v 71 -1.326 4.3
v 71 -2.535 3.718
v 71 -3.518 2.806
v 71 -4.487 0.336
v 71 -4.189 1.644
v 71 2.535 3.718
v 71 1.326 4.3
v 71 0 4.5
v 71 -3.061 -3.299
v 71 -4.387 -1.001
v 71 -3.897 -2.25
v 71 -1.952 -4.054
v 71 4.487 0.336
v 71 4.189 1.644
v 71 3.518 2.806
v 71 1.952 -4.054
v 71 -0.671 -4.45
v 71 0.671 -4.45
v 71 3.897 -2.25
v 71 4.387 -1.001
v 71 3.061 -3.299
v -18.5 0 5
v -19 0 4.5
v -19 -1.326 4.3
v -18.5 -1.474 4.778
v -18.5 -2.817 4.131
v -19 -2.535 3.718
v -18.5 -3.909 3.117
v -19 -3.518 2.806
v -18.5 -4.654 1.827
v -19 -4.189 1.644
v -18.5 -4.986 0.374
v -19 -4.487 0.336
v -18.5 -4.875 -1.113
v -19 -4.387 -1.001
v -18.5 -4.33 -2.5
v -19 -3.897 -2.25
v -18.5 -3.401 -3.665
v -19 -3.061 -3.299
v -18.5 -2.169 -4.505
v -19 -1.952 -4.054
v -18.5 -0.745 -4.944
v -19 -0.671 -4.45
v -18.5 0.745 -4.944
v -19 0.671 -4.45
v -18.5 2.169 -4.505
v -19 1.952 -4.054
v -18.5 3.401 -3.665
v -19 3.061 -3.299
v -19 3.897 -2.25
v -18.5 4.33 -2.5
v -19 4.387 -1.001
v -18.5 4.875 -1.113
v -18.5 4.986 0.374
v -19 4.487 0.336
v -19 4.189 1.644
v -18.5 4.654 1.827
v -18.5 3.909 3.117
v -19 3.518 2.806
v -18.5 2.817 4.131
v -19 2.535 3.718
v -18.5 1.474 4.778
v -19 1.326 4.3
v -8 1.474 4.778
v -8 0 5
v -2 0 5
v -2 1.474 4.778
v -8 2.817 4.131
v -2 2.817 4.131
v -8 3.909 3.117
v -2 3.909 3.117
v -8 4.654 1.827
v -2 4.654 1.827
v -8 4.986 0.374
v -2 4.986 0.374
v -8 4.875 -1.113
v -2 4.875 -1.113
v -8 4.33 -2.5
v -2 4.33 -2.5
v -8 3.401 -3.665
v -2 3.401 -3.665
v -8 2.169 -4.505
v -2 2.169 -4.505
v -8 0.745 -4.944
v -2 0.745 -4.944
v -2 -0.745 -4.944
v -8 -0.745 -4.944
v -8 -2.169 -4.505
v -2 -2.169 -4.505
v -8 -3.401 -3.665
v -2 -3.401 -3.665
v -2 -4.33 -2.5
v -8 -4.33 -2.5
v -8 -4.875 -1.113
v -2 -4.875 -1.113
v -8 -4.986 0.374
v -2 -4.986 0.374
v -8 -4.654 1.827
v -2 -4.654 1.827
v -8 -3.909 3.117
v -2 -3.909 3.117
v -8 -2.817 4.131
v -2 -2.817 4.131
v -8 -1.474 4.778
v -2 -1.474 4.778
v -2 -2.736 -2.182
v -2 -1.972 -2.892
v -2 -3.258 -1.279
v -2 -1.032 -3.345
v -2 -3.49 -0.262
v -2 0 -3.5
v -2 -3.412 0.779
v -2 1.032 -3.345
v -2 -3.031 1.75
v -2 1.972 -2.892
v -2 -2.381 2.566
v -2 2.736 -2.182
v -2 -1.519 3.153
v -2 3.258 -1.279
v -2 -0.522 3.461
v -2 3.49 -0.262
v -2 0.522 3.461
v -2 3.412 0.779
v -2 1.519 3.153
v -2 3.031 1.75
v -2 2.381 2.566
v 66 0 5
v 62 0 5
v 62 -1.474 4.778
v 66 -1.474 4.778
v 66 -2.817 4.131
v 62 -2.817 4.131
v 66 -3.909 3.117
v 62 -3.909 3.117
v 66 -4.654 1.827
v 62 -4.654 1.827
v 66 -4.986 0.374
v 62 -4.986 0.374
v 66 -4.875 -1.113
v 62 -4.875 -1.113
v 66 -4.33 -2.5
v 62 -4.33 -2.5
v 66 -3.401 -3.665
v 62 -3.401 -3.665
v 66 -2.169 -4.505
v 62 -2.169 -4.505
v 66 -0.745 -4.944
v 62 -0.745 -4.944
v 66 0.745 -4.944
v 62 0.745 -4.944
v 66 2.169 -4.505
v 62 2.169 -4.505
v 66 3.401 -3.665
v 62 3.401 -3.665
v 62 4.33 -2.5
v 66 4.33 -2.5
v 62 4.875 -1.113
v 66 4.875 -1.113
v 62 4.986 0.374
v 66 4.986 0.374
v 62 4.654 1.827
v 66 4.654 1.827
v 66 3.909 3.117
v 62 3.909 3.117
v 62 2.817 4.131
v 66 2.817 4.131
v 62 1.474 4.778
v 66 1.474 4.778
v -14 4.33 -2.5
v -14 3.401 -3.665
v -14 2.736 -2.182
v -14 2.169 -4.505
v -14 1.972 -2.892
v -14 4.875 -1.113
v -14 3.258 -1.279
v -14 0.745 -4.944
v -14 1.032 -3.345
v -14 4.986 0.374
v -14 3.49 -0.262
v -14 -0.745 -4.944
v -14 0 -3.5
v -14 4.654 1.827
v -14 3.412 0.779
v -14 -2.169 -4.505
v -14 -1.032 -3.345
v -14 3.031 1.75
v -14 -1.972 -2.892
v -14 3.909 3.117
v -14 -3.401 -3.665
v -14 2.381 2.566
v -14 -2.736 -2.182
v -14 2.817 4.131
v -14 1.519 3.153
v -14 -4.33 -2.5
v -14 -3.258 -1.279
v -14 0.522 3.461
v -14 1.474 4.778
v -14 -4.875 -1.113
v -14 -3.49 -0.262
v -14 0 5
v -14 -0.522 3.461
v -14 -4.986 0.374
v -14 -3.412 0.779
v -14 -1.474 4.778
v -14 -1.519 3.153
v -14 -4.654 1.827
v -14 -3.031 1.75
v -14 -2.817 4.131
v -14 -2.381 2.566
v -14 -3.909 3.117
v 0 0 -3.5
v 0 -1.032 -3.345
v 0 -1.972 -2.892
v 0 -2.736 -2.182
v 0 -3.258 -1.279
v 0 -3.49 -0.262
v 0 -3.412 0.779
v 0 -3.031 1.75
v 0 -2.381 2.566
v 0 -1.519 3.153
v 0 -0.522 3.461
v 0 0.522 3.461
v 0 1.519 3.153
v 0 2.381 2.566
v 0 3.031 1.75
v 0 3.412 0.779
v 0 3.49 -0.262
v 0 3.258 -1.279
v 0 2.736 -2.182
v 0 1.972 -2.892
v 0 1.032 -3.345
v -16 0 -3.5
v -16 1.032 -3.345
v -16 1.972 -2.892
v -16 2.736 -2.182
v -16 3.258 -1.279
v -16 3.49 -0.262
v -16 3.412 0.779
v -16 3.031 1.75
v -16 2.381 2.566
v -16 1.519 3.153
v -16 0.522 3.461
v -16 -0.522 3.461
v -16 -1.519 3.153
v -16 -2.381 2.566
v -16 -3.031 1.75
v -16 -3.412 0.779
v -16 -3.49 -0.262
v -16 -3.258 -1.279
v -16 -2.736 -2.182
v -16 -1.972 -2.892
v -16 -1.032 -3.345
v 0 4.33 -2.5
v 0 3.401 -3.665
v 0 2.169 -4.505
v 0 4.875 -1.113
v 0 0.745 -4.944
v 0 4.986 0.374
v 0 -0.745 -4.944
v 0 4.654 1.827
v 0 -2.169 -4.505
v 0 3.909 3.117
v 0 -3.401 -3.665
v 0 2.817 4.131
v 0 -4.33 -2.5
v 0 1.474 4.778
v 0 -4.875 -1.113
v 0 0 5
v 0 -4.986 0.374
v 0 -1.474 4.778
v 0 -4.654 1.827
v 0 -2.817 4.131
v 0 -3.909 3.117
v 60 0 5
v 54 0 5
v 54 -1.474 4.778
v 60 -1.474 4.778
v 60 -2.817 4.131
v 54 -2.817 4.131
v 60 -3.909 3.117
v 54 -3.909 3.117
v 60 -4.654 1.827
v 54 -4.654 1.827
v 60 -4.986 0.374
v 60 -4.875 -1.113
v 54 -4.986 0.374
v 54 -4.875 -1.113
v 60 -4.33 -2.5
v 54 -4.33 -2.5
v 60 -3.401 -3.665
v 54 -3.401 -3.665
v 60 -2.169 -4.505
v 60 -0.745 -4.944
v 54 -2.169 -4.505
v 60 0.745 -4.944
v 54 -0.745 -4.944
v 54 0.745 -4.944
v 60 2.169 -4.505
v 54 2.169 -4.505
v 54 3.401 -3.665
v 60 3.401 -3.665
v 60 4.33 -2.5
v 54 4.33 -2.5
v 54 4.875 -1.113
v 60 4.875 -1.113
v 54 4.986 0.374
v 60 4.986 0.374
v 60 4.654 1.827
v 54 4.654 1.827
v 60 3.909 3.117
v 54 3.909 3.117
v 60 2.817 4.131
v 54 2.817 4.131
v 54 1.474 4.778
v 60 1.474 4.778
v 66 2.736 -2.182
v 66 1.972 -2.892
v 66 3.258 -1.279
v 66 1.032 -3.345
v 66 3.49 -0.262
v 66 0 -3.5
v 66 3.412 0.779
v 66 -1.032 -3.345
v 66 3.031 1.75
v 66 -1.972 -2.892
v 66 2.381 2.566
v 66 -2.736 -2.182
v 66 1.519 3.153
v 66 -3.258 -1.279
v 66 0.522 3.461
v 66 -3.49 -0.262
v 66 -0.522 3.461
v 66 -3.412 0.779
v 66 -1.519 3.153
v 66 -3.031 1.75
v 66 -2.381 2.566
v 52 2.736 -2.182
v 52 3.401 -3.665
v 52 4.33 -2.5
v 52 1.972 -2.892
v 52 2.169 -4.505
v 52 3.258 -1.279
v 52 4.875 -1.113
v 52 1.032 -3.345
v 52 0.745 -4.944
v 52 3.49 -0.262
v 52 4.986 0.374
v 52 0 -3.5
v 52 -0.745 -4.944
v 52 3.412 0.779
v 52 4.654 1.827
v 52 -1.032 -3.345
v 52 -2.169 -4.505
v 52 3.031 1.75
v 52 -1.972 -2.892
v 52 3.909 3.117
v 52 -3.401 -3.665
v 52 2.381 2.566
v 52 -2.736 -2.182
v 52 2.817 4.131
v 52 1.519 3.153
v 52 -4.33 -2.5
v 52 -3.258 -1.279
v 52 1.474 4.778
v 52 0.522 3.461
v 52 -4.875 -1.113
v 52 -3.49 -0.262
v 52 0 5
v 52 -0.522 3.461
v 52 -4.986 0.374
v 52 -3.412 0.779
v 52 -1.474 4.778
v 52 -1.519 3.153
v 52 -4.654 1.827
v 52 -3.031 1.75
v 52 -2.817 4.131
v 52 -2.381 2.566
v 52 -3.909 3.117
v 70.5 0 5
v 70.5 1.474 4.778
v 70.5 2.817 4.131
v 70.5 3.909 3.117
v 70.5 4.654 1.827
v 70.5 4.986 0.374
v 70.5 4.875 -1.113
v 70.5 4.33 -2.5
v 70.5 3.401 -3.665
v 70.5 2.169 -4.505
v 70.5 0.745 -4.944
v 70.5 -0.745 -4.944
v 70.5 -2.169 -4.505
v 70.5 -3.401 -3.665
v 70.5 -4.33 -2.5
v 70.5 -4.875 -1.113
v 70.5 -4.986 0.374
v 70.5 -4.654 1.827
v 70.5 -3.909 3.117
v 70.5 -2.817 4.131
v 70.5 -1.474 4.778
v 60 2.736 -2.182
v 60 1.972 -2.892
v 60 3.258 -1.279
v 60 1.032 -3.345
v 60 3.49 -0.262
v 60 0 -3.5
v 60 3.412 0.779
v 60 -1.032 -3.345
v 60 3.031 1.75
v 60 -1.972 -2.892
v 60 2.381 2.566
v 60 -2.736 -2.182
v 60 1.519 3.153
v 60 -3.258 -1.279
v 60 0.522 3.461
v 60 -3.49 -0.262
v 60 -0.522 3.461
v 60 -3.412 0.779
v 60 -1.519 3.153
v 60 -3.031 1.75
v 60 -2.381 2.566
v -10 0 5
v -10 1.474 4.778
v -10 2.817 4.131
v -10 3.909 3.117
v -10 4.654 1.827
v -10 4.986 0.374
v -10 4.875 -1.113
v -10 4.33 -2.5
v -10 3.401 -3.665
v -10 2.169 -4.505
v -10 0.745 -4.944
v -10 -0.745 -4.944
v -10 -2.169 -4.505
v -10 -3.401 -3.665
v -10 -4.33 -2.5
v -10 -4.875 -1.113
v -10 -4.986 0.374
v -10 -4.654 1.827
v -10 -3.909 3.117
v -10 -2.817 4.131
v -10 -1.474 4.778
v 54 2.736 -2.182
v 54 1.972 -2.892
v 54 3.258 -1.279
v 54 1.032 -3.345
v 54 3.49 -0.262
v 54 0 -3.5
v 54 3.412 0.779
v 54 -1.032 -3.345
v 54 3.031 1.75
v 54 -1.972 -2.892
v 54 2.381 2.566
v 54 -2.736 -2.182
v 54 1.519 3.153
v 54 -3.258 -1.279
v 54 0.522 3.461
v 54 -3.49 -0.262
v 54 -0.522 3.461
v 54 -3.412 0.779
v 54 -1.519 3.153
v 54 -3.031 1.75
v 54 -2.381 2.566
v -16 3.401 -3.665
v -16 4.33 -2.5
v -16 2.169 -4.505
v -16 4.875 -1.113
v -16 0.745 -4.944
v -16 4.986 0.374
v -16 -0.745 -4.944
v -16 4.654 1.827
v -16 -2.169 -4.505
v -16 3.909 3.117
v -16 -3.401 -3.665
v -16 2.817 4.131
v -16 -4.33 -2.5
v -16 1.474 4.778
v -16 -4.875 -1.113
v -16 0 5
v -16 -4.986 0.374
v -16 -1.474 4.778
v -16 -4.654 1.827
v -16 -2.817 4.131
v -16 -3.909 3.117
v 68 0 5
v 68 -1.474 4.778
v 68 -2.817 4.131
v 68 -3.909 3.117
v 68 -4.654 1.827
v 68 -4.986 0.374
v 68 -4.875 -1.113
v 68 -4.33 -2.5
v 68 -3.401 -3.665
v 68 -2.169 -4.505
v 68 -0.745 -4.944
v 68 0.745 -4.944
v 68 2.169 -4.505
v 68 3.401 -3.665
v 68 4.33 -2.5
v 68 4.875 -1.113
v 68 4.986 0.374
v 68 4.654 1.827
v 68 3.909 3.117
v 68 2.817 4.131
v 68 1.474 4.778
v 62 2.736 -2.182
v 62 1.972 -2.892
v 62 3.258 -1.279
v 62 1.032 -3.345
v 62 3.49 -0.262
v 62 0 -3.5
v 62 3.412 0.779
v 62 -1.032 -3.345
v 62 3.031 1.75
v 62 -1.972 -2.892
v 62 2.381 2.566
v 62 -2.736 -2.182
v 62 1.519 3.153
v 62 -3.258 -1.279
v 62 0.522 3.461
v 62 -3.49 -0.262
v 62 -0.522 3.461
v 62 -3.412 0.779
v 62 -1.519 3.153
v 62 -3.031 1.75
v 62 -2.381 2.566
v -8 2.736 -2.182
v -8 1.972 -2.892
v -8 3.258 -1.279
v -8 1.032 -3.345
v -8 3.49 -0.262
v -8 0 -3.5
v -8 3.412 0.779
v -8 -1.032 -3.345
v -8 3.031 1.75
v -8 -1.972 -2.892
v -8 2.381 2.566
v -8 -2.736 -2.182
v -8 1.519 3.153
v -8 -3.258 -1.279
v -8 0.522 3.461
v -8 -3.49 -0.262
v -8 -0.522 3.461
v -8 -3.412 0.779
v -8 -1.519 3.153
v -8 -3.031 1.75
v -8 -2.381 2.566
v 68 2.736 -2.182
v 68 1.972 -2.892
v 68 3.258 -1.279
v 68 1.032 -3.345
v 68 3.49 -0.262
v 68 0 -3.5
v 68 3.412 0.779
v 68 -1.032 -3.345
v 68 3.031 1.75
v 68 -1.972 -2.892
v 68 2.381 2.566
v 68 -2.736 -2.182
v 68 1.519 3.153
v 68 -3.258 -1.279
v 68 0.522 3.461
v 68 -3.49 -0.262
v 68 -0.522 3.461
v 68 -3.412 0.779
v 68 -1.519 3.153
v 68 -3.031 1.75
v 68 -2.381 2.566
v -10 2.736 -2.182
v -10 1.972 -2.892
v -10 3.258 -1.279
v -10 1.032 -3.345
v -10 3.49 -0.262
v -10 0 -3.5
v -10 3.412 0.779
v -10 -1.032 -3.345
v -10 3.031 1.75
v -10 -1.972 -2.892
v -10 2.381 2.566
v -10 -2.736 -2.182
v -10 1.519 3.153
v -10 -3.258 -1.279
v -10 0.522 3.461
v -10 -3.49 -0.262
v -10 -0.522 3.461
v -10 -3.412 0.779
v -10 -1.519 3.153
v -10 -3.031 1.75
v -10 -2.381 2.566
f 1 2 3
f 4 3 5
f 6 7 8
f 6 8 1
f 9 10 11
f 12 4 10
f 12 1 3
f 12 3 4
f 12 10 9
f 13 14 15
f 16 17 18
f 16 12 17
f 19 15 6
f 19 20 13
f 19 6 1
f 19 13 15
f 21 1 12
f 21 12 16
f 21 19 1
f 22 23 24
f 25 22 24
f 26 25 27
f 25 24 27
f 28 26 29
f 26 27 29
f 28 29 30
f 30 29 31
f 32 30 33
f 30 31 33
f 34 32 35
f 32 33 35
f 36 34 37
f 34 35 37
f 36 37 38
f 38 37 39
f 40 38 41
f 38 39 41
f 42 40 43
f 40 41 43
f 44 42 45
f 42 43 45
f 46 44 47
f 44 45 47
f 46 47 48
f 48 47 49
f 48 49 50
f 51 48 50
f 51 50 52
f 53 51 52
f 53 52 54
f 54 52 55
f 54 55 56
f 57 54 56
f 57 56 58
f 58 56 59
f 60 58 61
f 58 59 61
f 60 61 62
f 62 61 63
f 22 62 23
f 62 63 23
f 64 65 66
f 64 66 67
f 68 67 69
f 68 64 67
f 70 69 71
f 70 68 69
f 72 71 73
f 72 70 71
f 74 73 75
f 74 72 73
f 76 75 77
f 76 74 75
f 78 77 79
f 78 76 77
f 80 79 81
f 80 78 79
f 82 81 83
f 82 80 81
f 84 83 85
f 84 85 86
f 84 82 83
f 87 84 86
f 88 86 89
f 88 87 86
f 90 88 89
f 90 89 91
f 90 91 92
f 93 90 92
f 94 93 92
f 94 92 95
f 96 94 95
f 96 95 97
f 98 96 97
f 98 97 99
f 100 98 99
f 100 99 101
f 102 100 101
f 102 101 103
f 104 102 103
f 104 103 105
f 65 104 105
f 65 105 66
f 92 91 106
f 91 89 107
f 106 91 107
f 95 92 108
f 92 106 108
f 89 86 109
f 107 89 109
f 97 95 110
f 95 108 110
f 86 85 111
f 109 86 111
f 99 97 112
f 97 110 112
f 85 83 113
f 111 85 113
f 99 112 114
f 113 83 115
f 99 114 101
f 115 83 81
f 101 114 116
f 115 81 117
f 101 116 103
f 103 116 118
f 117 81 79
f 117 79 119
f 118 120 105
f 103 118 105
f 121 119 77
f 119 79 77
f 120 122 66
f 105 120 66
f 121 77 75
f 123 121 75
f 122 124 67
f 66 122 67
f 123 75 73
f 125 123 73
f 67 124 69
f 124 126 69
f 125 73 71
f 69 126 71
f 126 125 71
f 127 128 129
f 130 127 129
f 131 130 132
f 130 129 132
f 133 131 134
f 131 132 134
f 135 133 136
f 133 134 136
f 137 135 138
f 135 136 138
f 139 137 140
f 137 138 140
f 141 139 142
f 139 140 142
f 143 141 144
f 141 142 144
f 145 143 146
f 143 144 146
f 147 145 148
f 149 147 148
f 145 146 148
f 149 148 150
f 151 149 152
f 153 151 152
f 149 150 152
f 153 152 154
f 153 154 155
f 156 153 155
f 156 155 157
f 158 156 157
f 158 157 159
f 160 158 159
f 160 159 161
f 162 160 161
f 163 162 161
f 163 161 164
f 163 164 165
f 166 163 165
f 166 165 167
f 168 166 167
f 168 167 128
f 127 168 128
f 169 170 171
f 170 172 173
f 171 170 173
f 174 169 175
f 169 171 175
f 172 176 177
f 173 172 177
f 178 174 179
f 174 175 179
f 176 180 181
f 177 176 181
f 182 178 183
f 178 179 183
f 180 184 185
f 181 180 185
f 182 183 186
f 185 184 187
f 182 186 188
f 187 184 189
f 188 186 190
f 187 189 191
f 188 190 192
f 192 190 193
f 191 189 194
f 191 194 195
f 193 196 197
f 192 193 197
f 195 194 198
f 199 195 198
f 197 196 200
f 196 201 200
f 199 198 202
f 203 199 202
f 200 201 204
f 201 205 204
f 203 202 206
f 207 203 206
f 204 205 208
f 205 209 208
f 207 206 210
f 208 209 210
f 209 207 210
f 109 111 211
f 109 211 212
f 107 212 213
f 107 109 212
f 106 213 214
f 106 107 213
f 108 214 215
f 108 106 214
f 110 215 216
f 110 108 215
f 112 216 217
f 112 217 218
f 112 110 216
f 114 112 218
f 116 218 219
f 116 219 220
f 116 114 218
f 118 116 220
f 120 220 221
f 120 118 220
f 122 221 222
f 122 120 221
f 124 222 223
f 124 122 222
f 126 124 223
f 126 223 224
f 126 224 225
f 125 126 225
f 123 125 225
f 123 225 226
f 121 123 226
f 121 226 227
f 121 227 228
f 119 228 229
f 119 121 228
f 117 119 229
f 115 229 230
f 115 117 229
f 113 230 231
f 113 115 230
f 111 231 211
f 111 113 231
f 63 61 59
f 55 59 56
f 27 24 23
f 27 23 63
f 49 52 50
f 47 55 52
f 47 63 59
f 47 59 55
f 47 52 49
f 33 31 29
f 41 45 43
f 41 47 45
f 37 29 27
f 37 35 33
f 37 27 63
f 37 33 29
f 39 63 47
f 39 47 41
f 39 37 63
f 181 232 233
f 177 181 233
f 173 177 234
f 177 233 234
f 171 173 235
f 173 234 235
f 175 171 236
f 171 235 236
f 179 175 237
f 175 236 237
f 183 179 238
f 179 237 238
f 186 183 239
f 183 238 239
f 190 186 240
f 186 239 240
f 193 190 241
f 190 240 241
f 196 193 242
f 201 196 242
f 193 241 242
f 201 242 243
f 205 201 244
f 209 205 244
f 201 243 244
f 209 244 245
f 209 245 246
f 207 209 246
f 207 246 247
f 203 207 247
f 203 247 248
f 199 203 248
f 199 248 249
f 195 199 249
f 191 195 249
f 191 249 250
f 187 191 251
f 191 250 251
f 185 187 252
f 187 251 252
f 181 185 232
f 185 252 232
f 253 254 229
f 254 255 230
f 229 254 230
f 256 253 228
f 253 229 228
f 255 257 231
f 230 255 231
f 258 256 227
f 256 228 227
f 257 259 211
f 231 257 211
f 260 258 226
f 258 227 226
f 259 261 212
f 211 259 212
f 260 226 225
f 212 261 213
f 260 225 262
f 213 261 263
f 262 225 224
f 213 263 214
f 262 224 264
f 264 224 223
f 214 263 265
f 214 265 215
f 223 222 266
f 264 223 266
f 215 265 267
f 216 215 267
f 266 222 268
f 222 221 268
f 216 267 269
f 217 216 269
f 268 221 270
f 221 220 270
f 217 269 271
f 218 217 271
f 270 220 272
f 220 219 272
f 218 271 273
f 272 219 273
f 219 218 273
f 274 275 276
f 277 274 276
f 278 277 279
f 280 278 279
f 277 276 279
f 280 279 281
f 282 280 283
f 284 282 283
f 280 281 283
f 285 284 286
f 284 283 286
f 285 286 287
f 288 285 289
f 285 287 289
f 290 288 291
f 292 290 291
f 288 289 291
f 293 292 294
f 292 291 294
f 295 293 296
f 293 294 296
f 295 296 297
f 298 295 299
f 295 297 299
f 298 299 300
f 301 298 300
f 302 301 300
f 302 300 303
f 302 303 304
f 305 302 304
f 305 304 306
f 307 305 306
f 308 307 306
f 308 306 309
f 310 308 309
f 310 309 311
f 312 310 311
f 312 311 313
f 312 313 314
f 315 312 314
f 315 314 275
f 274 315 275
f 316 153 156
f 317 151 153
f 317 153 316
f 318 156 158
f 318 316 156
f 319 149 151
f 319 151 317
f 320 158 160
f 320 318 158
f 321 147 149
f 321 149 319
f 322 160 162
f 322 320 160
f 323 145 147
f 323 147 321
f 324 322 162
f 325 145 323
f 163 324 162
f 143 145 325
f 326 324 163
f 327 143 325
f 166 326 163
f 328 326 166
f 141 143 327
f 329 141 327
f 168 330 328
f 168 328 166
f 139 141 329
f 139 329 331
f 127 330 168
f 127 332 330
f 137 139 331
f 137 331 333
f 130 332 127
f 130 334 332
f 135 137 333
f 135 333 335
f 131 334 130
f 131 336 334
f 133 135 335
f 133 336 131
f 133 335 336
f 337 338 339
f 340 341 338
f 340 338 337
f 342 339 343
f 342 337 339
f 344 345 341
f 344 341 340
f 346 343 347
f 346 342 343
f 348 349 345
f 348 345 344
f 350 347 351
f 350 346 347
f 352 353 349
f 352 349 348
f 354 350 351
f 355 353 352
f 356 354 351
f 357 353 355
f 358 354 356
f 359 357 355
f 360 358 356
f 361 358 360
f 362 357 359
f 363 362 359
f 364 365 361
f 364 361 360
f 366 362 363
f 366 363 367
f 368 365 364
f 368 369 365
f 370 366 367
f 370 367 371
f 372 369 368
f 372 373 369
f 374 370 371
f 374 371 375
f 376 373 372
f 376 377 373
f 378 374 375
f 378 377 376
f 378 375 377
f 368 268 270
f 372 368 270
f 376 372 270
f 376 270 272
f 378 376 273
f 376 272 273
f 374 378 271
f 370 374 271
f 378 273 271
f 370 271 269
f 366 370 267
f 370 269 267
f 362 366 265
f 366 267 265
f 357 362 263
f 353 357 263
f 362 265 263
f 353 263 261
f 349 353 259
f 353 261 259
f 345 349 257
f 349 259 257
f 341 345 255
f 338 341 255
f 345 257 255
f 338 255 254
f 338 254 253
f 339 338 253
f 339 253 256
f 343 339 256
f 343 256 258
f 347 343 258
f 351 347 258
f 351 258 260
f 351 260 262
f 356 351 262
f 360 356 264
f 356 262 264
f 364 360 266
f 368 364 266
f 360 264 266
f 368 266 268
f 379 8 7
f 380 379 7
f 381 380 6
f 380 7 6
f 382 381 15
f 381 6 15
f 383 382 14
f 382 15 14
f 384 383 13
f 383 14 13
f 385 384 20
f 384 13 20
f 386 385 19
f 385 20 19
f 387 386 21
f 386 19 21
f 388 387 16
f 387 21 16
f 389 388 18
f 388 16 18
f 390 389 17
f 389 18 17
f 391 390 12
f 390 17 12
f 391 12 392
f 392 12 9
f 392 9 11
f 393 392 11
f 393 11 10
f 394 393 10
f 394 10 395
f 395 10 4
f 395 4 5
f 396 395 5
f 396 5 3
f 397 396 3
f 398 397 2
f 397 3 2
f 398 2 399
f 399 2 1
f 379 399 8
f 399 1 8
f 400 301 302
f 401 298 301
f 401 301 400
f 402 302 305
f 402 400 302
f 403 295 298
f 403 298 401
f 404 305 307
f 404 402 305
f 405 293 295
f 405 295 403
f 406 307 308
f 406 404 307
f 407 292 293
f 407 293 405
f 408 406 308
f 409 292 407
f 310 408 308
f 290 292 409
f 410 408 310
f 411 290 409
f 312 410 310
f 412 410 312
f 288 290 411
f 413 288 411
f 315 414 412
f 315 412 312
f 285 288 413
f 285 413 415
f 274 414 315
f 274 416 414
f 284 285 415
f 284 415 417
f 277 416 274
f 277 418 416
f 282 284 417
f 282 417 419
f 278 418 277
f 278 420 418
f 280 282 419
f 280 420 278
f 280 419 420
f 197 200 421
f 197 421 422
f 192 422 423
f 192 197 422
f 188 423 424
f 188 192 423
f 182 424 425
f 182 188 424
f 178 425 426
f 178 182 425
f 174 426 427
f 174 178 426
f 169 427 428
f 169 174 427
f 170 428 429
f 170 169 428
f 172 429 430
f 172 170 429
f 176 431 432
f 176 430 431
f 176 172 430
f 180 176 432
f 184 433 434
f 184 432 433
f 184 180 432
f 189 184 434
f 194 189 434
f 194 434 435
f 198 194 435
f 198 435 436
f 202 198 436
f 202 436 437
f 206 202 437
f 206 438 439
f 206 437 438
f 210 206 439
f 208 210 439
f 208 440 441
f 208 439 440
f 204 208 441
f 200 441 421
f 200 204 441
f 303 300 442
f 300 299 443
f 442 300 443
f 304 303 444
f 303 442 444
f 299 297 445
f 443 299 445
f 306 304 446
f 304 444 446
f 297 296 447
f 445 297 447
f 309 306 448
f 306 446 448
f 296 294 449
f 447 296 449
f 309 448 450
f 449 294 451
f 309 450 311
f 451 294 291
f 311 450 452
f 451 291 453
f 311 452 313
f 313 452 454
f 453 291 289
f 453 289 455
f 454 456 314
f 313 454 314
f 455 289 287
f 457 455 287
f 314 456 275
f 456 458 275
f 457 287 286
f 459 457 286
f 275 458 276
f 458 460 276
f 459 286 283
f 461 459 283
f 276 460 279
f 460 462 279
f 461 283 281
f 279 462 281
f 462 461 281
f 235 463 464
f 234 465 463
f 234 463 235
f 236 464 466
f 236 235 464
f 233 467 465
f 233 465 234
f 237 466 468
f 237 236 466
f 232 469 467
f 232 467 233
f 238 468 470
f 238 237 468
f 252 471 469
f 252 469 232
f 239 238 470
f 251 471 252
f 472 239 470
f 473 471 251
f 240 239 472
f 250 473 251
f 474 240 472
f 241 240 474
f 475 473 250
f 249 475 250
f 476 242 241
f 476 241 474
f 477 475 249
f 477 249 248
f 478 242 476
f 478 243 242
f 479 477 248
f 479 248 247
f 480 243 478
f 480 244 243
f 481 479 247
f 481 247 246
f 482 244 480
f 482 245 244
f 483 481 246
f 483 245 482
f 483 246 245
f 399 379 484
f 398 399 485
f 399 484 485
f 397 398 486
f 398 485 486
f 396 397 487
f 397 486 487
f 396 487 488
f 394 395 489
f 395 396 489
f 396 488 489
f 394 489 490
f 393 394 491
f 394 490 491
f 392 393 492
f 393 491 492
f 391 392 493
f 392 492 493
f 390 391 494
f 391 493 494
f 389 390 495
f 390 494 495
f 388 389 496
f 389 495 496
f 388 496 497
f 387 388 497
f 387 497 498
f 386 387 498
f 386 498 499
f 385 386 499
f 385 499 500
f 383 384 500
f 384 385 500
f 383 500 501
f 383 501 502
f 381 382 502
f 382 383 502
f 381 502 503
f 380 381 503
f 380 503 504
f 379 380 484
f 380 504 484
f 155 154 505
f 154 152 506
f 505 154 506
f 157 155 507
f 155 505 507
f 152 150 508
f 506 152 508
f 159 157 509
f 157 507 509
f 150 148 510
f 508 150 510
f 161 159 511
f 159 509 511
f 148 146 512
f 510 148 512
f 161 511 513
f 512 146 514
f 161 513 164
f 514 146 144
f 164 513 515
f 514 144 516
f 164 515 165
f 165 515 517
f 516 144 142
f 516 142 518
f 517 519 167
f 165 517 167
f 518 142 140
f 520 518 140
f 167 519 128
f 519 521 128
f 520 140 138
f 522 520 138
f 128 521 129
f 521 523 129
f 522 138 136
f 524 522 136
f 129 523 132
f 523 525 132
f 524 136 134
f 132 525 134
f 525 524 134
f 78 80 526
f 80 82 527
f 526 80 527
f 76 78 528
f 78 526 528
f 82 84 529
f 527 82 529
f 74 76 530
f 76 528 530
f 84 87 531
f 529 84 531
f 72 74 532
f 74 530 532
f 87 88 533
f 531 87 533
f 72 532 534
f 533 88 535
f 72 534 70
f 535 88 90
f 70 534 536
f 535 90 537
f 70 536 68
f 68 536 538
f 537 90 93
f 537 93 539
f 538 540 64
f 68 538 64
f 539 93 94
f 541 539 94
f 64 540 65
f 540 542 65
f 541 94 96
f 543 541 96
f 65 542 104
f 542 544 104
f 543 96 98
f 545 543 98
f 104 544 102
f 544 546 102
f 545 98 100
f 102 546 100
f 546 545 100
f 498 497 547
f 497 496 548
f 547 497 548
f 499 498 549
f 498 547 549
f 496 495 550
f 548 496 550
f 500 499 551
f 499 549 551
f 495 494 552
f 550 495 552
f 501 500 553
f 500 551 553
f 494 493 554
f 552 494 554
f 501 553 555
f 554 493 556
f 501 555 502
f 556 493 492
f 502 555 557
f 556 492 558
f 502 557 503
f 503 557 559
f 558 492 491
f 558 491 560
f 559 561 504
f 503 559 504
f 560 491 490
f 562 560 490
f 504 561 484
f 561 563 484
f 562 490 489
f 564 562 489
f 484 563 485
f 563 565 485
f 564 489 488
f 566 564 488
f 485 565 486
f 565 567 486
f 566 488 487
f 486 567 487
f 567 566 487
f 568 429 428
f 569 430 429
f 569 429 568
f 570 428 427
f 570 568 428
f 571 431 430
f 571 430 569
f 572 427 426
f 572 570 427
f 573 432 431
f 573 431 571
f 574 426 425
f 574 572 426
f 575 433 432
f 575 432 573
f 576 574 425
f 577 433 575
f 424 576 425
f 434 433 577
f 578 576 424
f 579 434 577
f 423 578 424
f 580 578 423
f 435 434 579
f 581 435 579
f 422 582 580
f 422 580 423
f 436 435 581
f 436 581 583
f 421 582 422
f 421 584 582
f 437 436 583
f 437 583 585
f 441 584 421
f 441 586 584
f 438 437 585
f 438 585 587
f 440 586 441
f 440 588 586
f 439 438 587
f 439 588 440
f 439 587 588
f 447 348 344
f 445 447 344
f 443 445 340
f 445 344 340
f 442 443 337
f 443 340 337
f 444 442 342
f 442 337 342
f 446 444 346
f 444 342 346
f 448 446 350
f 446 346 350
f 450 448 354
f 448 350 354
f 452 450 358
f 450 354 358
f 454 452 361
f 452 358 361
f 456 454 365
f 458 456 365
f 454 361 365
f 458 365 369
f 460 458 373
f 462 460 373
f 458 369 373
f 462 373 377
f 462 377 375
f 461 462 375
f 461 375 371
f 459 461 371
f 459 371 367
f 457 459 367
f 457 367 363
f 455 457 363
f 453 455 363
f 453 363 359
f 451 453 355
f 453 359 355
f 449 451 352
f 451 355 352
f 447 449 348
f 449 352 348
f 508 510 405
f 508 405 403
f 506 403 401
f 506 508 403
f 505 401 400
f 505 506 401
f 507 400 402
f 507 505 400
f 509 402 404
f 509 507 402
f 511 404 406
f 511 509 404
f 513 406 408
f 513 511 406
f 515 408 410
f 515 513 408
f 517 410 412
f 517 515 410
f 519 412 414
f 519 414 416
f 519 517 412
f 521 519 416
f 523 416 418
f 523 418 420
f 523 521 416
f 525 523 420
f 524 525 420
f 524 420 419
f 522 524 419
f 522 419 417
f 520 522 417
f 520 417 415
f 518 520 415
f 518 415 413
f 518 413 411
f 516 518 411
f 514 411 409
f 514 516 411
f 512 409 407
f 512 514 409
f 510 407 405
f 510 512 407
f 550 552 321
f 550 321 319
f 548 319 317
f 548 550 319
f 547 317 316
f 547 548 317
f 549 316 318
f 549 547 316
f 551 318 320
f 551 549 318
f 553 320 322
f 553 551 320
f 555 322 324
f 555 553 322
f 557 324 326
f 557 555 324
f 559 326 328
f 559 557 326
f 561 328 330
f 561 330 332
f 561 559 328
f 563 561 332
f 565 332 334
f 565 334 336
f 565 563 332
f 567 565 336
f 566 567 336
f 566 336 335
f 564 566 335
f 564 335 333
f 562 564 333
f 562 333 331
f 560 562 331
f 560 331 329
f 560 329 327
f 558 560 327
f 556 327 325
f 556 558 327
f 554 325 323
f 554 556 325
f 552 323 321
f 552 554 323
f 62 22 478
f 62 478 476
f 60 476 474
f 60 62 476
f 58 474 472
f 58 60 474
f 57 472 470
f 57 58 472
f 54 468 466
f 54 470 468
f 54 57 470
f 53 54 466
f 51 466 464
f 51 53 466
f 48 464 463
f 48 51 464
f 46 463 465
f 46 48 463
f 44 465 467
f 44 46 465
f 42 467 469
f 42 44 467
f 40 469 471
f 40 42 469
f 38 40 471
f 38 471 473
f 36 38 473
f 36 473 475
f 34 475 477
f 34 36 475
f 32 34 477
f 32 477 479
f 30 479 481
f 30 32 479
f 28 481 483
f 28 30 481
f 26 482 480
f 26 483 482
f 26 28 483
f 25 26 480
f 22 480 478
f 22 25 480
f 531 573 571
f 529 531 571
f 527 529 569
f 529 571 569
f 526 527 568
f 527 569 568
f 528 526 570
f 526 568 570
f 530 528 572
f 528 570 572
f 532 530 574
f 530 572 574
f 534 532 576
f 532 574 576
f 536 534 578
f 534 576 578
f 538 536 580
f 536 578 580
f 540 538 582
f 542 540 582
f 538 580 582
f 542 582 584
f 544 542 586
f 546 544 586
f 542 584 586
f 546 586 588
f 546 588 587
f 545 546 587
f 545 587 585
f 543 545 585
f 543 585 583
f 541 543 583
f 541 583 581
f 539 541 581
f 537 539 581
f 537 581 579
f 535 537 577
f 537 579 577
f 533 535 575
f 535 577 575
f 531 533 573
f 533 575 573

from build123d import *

# Parameters (mm, degrees)
SKETCH_1_R          = 5
EXTRUDE_1_DEPTH     = 52
SKETCH_2_R          = 3.5
EXTRUDE_2_DEPTH     = 2
SKETCH_3_R          = 5
EXTRUDE_3_DEPTH     = 14
SKETCH_4_R          = 5
EXTRUDE_4_DEPTH     = 2
SKETCH_5_R          = 5
EXTRUDE_5_DEPTH     = 4
SKETCH_6_R          = 5
EXTRUDE_6_DEPTH     = 2
SKETCH_7_R          = 5
EXTRUDE_7_DEPTH     = 10
EXTRUDE_START       = 2
SKETCH_8_R          = 3.5
EXTRUDE_8_DEPTH     = 2
EXTRUDE_START_2     = 14
SKETCH_9_R          = 5
EXTRUDE_9_DEPTH     = 14
SKETCH_10_R         = 5
EXTRUDE_10_DEPTH    = 2
EXTRUDE_START_3     = 4
SKETCH_11_R         = 5
EXTRUDE_11_DEPTH    = 4
SKETCH_12_R         = 5
EXTRUDE_12_DEPTH    = 2
EXTRUDE_START_4     = 10
SKETCH_13_R         = 5
EXTRUDE_13_DEPTH    = 10
CHAMFER_1_SIZE      = 0.5
CUT_EXTRUDE_START   = -2
SKETCH_14_R         = 5
SKETCH_14_R_2       = 3.5
CUT_EXTRUDE_1_DEPTH = 2
SKETCH_15_R         = 5
SKETCH_15_R_2       = 3.5
CUT_EXTRUDE_2_DEPTH = 2
CUT_EXTRUDE_START_2 = -15
SKETCH_16_R         = 5
CUT_EXTRUDE_3_DEPTH = 15
SKETCH_17_R         = 5
CUT_EXTRUDE_4_DEPTH = 15
CHAMFER_2_SIZE      = 0.5


with BuildPart() as part:
    # 草图1 → 凸台-拉伸1 (new body)
    with BuildSketch(Plane(origin=(0, 0, 0), x_dir=(0, 0, -1), z_dir=(1, 0, 0))):
        with Locations(Location((0, 0, 0), (0, 0, 180))):
            Circle(SKETCH_1_R)
    extrude(amount=EXTRUDE_1_DEPTH)

    # 草图2 → 凸台-拉伸2 (add)
    with BuildSketch(Plane(origin=(52, 0, 0), x_dir=(0, 0, -1), z_dir=(1, 0, 0))):
        Circle(SKETCH_2_R)
    extrude(amount=EXTRUDE_2_DEPTH)

    # 草图3 → 凸台-拉伸3 (add)
    with BuildSketch(Plane(origin=(54, 0, 0), x_dir=(0, 0, -1), z_dir=(1, 0, 0))):
        with Locations(Location((0, 0, 0), (0, 0, 180))):
            Circle(SKETCH_3_R)
    extrude(amount=EXTRUDE_3_DEPTH)

    # 草图4 → 凸台-拉伸4 (add)
    with BuildSketch(Plane(origin=(68, 0, 0), x_dir=(0, 0, -1), z_dir=(1, 0, 0))):
        with Locations(Location((0, 0, 0), (0, 0, 180))):
            Circle(SKETCH_4_R)
    extrude(amount=EXTRUDE_4_DEPTH)

    # 草图5 → 凸台-拉伸5 (add)
    with BuildSketch(Plane(origin=(70, 0, 0), x_dir=(0, 0, -1), z_dir=(1, 0, 0))):
        with Locations(Location((0, 0, 0), (0, 0, 180))):
            Circle(SKETCH_5_R)
    extrude(amount=EXTRUDE_5_DEPTH)

    # 草图6 → 凸台-拉伸6 (add)
    with BuildSketch(Plane(origin=(74, 0, 0), x_dir=(0, 0, -1), z_dir=(1, 0, 0))):
        with Locations(Location((0, 0, 0), (0, 0, 180))):
            Circle(SKETCH_6_R)
    extrude(amount=EXTRUDE_6_DEPTH)

    # 草图7 → 凸台-拉伸7 (add)
    with BuildSketch(Plane(origin=(76, 0, 0), x_dir=(0, 0, -1), z_dir=(1, 0, 0))):
        with Locations(Location((0, 0, 0), (0, 0, 180))):
            Circle(SKETCH_7_R)
    extrude(amount=EXTRUDE_7_DEPTH)

    # 草图8 → 凸台-拉伸8 (add)
    with BuildSketch(Plane.ZY.offset(EXTRUDE_START)):
        with Locations(Location((0, 0, 0), (0, 0, 180))):
            Circle(SKETCH_8_R)
    extrude(amount=-EXTRUDE_8_DEPTH)

    # 草图9 → 凸台-拉伸9 (add)
    with BuildSketch(Plane.ZY.offset(2).offset(EXTRUDE_START_2)):
        Circle(SKETCH_9_R)
    extrude(amount=-EXTRUDE_9_DEPTH)

    # 草图10 → 凸台-拉伸10 (add)
    with BuildSketch(Plane.ZY.offset(16).offset(EXTRUDE_START)):
        Circle(SKETCH_10_R)
    extrude(amount=-EXTRUDE_10_DEPTH)

    # 草图11 → 凸台-拉伸11 (add)
    with BuildSketch(Plane.ZY.offset(18).offset(EXTRUDE_START_3)):
        Circle(SKETCH_11_R)
    extrude(amount=-EXTRUDE_11_DEPTH)

    # 草图12 → 凸台-拉伸12 (add)
    with BuildSketch(Plane.ZY.offset(22).offset(EXTRUDE_START)):
        Circle(SKETCH_12_R)
    extrude(amount=-EXTRUDE_12_DEPTH)

    # 草图13 → 凸台-拉伸13 (add)
    with BuildSketch(Plane.ZY.offset(24).offset(EXTRUDE_START_4)):
        Circle(SKETCH_13_R)
    extrude(amount=-EXTRUDE_13_DEPTH)

    # 倒角1
    chamfer_1_edges = [part.edges().sort_by_distance(p)[0] for p in [
        (86, 0, -5),
        (-34, 0, -5),
    ]]
    chamfer(chamfer_1_edges, length=CHAMFER_1_SIZE)

    # 草图14 → 切除-拉伸1 (cut)
    with BuildSketch(Plane(origin=(-8, 0, 0), x_dir=(0, 0, -1), z_dir=(1, 0, 0)).offset(CUT_EXTRUDE_START)):
        with Locations(Location((0, 0, 0), (0, 0, 180))):
            Circle(SKETCH_14_R)
        Circle(SKETCH_14_R_2, mode=Mode.SUBTRACT)
    cut_extrude_1 = extrude(amount=CUT_EXTRUDE_1_DEPTH, mode=Mode.SUBTRACT)

    # 草图15 → 切除-拉伸2 (cut)
    with BuildSketch(Plane(origin=(-14, 0, 0), x_dir=(0, 0, -1), z_dir=(1, 0, 0)).offset(CUT_EXTRUDE_START)):
        with Locations(Location((0, 0, 0), (0, 0, 180))):
            Circle(SKETCH_15_R)
        Circle(SKETCH_15_R_2, mode=Mode.SUBTRACT)
    cut_extrude_2 = extrude(amount=CUT_EXTRUDE_2_DEPTH, mode=Mode.SUBTRACT)

    # 镜向1: 切除-拉伸1, 切除-拉伸2 across plane
    add(cut_extrude_1.mirror(Plane(origin=(26, 0, 0), x_dir=(0, 0, 1), z_dir=(1, 0, 0))), mode=Mode.SUBTRACT)
    add(cut_extrude_2.mirror(Plane(origin=(26, 0, 0), x_dir=(0, 0, 1), z_dir=(1, 0, 0))), mode=Mode.SUBTRACT)

    # 草图16 → 切除-拉伸3 (cut)
    with BuildSketch(Plane(origin=(86, 0, 0), x_dir=(0, 0, -1), z_dir=(1, 0, 0)).offset(CUT_EXTRUDE_START_2)):
        Circle(SKETCH_16_R)
    extrude(amount=CUT_EXTRUDE_3_DEPTH, mode=Mode.SUBTRACT)

    # 草图17 → 切除-拉伸4 (cut)
    with BuildSketch(Plane.ZY.offset(34)):
        with Locations(Location((0, 0, 0), (0, 0, 180))):
            Circle(SKETCH_17_R)
    extrude(amount=-CUT_EXTRUDE_4_DEPTH, mode=Mode.SUBTRACT)

    # 倒角2
    chamfer_2_edges = [part.edges().sort_by_distance(p)[0] for p in [
        (-19, 0, -5),
        (71, 0, -5),
    ]]
    chamfer(chamfer_2_edges, length=CHAMFER_2_SIZE)


solid = part.part
